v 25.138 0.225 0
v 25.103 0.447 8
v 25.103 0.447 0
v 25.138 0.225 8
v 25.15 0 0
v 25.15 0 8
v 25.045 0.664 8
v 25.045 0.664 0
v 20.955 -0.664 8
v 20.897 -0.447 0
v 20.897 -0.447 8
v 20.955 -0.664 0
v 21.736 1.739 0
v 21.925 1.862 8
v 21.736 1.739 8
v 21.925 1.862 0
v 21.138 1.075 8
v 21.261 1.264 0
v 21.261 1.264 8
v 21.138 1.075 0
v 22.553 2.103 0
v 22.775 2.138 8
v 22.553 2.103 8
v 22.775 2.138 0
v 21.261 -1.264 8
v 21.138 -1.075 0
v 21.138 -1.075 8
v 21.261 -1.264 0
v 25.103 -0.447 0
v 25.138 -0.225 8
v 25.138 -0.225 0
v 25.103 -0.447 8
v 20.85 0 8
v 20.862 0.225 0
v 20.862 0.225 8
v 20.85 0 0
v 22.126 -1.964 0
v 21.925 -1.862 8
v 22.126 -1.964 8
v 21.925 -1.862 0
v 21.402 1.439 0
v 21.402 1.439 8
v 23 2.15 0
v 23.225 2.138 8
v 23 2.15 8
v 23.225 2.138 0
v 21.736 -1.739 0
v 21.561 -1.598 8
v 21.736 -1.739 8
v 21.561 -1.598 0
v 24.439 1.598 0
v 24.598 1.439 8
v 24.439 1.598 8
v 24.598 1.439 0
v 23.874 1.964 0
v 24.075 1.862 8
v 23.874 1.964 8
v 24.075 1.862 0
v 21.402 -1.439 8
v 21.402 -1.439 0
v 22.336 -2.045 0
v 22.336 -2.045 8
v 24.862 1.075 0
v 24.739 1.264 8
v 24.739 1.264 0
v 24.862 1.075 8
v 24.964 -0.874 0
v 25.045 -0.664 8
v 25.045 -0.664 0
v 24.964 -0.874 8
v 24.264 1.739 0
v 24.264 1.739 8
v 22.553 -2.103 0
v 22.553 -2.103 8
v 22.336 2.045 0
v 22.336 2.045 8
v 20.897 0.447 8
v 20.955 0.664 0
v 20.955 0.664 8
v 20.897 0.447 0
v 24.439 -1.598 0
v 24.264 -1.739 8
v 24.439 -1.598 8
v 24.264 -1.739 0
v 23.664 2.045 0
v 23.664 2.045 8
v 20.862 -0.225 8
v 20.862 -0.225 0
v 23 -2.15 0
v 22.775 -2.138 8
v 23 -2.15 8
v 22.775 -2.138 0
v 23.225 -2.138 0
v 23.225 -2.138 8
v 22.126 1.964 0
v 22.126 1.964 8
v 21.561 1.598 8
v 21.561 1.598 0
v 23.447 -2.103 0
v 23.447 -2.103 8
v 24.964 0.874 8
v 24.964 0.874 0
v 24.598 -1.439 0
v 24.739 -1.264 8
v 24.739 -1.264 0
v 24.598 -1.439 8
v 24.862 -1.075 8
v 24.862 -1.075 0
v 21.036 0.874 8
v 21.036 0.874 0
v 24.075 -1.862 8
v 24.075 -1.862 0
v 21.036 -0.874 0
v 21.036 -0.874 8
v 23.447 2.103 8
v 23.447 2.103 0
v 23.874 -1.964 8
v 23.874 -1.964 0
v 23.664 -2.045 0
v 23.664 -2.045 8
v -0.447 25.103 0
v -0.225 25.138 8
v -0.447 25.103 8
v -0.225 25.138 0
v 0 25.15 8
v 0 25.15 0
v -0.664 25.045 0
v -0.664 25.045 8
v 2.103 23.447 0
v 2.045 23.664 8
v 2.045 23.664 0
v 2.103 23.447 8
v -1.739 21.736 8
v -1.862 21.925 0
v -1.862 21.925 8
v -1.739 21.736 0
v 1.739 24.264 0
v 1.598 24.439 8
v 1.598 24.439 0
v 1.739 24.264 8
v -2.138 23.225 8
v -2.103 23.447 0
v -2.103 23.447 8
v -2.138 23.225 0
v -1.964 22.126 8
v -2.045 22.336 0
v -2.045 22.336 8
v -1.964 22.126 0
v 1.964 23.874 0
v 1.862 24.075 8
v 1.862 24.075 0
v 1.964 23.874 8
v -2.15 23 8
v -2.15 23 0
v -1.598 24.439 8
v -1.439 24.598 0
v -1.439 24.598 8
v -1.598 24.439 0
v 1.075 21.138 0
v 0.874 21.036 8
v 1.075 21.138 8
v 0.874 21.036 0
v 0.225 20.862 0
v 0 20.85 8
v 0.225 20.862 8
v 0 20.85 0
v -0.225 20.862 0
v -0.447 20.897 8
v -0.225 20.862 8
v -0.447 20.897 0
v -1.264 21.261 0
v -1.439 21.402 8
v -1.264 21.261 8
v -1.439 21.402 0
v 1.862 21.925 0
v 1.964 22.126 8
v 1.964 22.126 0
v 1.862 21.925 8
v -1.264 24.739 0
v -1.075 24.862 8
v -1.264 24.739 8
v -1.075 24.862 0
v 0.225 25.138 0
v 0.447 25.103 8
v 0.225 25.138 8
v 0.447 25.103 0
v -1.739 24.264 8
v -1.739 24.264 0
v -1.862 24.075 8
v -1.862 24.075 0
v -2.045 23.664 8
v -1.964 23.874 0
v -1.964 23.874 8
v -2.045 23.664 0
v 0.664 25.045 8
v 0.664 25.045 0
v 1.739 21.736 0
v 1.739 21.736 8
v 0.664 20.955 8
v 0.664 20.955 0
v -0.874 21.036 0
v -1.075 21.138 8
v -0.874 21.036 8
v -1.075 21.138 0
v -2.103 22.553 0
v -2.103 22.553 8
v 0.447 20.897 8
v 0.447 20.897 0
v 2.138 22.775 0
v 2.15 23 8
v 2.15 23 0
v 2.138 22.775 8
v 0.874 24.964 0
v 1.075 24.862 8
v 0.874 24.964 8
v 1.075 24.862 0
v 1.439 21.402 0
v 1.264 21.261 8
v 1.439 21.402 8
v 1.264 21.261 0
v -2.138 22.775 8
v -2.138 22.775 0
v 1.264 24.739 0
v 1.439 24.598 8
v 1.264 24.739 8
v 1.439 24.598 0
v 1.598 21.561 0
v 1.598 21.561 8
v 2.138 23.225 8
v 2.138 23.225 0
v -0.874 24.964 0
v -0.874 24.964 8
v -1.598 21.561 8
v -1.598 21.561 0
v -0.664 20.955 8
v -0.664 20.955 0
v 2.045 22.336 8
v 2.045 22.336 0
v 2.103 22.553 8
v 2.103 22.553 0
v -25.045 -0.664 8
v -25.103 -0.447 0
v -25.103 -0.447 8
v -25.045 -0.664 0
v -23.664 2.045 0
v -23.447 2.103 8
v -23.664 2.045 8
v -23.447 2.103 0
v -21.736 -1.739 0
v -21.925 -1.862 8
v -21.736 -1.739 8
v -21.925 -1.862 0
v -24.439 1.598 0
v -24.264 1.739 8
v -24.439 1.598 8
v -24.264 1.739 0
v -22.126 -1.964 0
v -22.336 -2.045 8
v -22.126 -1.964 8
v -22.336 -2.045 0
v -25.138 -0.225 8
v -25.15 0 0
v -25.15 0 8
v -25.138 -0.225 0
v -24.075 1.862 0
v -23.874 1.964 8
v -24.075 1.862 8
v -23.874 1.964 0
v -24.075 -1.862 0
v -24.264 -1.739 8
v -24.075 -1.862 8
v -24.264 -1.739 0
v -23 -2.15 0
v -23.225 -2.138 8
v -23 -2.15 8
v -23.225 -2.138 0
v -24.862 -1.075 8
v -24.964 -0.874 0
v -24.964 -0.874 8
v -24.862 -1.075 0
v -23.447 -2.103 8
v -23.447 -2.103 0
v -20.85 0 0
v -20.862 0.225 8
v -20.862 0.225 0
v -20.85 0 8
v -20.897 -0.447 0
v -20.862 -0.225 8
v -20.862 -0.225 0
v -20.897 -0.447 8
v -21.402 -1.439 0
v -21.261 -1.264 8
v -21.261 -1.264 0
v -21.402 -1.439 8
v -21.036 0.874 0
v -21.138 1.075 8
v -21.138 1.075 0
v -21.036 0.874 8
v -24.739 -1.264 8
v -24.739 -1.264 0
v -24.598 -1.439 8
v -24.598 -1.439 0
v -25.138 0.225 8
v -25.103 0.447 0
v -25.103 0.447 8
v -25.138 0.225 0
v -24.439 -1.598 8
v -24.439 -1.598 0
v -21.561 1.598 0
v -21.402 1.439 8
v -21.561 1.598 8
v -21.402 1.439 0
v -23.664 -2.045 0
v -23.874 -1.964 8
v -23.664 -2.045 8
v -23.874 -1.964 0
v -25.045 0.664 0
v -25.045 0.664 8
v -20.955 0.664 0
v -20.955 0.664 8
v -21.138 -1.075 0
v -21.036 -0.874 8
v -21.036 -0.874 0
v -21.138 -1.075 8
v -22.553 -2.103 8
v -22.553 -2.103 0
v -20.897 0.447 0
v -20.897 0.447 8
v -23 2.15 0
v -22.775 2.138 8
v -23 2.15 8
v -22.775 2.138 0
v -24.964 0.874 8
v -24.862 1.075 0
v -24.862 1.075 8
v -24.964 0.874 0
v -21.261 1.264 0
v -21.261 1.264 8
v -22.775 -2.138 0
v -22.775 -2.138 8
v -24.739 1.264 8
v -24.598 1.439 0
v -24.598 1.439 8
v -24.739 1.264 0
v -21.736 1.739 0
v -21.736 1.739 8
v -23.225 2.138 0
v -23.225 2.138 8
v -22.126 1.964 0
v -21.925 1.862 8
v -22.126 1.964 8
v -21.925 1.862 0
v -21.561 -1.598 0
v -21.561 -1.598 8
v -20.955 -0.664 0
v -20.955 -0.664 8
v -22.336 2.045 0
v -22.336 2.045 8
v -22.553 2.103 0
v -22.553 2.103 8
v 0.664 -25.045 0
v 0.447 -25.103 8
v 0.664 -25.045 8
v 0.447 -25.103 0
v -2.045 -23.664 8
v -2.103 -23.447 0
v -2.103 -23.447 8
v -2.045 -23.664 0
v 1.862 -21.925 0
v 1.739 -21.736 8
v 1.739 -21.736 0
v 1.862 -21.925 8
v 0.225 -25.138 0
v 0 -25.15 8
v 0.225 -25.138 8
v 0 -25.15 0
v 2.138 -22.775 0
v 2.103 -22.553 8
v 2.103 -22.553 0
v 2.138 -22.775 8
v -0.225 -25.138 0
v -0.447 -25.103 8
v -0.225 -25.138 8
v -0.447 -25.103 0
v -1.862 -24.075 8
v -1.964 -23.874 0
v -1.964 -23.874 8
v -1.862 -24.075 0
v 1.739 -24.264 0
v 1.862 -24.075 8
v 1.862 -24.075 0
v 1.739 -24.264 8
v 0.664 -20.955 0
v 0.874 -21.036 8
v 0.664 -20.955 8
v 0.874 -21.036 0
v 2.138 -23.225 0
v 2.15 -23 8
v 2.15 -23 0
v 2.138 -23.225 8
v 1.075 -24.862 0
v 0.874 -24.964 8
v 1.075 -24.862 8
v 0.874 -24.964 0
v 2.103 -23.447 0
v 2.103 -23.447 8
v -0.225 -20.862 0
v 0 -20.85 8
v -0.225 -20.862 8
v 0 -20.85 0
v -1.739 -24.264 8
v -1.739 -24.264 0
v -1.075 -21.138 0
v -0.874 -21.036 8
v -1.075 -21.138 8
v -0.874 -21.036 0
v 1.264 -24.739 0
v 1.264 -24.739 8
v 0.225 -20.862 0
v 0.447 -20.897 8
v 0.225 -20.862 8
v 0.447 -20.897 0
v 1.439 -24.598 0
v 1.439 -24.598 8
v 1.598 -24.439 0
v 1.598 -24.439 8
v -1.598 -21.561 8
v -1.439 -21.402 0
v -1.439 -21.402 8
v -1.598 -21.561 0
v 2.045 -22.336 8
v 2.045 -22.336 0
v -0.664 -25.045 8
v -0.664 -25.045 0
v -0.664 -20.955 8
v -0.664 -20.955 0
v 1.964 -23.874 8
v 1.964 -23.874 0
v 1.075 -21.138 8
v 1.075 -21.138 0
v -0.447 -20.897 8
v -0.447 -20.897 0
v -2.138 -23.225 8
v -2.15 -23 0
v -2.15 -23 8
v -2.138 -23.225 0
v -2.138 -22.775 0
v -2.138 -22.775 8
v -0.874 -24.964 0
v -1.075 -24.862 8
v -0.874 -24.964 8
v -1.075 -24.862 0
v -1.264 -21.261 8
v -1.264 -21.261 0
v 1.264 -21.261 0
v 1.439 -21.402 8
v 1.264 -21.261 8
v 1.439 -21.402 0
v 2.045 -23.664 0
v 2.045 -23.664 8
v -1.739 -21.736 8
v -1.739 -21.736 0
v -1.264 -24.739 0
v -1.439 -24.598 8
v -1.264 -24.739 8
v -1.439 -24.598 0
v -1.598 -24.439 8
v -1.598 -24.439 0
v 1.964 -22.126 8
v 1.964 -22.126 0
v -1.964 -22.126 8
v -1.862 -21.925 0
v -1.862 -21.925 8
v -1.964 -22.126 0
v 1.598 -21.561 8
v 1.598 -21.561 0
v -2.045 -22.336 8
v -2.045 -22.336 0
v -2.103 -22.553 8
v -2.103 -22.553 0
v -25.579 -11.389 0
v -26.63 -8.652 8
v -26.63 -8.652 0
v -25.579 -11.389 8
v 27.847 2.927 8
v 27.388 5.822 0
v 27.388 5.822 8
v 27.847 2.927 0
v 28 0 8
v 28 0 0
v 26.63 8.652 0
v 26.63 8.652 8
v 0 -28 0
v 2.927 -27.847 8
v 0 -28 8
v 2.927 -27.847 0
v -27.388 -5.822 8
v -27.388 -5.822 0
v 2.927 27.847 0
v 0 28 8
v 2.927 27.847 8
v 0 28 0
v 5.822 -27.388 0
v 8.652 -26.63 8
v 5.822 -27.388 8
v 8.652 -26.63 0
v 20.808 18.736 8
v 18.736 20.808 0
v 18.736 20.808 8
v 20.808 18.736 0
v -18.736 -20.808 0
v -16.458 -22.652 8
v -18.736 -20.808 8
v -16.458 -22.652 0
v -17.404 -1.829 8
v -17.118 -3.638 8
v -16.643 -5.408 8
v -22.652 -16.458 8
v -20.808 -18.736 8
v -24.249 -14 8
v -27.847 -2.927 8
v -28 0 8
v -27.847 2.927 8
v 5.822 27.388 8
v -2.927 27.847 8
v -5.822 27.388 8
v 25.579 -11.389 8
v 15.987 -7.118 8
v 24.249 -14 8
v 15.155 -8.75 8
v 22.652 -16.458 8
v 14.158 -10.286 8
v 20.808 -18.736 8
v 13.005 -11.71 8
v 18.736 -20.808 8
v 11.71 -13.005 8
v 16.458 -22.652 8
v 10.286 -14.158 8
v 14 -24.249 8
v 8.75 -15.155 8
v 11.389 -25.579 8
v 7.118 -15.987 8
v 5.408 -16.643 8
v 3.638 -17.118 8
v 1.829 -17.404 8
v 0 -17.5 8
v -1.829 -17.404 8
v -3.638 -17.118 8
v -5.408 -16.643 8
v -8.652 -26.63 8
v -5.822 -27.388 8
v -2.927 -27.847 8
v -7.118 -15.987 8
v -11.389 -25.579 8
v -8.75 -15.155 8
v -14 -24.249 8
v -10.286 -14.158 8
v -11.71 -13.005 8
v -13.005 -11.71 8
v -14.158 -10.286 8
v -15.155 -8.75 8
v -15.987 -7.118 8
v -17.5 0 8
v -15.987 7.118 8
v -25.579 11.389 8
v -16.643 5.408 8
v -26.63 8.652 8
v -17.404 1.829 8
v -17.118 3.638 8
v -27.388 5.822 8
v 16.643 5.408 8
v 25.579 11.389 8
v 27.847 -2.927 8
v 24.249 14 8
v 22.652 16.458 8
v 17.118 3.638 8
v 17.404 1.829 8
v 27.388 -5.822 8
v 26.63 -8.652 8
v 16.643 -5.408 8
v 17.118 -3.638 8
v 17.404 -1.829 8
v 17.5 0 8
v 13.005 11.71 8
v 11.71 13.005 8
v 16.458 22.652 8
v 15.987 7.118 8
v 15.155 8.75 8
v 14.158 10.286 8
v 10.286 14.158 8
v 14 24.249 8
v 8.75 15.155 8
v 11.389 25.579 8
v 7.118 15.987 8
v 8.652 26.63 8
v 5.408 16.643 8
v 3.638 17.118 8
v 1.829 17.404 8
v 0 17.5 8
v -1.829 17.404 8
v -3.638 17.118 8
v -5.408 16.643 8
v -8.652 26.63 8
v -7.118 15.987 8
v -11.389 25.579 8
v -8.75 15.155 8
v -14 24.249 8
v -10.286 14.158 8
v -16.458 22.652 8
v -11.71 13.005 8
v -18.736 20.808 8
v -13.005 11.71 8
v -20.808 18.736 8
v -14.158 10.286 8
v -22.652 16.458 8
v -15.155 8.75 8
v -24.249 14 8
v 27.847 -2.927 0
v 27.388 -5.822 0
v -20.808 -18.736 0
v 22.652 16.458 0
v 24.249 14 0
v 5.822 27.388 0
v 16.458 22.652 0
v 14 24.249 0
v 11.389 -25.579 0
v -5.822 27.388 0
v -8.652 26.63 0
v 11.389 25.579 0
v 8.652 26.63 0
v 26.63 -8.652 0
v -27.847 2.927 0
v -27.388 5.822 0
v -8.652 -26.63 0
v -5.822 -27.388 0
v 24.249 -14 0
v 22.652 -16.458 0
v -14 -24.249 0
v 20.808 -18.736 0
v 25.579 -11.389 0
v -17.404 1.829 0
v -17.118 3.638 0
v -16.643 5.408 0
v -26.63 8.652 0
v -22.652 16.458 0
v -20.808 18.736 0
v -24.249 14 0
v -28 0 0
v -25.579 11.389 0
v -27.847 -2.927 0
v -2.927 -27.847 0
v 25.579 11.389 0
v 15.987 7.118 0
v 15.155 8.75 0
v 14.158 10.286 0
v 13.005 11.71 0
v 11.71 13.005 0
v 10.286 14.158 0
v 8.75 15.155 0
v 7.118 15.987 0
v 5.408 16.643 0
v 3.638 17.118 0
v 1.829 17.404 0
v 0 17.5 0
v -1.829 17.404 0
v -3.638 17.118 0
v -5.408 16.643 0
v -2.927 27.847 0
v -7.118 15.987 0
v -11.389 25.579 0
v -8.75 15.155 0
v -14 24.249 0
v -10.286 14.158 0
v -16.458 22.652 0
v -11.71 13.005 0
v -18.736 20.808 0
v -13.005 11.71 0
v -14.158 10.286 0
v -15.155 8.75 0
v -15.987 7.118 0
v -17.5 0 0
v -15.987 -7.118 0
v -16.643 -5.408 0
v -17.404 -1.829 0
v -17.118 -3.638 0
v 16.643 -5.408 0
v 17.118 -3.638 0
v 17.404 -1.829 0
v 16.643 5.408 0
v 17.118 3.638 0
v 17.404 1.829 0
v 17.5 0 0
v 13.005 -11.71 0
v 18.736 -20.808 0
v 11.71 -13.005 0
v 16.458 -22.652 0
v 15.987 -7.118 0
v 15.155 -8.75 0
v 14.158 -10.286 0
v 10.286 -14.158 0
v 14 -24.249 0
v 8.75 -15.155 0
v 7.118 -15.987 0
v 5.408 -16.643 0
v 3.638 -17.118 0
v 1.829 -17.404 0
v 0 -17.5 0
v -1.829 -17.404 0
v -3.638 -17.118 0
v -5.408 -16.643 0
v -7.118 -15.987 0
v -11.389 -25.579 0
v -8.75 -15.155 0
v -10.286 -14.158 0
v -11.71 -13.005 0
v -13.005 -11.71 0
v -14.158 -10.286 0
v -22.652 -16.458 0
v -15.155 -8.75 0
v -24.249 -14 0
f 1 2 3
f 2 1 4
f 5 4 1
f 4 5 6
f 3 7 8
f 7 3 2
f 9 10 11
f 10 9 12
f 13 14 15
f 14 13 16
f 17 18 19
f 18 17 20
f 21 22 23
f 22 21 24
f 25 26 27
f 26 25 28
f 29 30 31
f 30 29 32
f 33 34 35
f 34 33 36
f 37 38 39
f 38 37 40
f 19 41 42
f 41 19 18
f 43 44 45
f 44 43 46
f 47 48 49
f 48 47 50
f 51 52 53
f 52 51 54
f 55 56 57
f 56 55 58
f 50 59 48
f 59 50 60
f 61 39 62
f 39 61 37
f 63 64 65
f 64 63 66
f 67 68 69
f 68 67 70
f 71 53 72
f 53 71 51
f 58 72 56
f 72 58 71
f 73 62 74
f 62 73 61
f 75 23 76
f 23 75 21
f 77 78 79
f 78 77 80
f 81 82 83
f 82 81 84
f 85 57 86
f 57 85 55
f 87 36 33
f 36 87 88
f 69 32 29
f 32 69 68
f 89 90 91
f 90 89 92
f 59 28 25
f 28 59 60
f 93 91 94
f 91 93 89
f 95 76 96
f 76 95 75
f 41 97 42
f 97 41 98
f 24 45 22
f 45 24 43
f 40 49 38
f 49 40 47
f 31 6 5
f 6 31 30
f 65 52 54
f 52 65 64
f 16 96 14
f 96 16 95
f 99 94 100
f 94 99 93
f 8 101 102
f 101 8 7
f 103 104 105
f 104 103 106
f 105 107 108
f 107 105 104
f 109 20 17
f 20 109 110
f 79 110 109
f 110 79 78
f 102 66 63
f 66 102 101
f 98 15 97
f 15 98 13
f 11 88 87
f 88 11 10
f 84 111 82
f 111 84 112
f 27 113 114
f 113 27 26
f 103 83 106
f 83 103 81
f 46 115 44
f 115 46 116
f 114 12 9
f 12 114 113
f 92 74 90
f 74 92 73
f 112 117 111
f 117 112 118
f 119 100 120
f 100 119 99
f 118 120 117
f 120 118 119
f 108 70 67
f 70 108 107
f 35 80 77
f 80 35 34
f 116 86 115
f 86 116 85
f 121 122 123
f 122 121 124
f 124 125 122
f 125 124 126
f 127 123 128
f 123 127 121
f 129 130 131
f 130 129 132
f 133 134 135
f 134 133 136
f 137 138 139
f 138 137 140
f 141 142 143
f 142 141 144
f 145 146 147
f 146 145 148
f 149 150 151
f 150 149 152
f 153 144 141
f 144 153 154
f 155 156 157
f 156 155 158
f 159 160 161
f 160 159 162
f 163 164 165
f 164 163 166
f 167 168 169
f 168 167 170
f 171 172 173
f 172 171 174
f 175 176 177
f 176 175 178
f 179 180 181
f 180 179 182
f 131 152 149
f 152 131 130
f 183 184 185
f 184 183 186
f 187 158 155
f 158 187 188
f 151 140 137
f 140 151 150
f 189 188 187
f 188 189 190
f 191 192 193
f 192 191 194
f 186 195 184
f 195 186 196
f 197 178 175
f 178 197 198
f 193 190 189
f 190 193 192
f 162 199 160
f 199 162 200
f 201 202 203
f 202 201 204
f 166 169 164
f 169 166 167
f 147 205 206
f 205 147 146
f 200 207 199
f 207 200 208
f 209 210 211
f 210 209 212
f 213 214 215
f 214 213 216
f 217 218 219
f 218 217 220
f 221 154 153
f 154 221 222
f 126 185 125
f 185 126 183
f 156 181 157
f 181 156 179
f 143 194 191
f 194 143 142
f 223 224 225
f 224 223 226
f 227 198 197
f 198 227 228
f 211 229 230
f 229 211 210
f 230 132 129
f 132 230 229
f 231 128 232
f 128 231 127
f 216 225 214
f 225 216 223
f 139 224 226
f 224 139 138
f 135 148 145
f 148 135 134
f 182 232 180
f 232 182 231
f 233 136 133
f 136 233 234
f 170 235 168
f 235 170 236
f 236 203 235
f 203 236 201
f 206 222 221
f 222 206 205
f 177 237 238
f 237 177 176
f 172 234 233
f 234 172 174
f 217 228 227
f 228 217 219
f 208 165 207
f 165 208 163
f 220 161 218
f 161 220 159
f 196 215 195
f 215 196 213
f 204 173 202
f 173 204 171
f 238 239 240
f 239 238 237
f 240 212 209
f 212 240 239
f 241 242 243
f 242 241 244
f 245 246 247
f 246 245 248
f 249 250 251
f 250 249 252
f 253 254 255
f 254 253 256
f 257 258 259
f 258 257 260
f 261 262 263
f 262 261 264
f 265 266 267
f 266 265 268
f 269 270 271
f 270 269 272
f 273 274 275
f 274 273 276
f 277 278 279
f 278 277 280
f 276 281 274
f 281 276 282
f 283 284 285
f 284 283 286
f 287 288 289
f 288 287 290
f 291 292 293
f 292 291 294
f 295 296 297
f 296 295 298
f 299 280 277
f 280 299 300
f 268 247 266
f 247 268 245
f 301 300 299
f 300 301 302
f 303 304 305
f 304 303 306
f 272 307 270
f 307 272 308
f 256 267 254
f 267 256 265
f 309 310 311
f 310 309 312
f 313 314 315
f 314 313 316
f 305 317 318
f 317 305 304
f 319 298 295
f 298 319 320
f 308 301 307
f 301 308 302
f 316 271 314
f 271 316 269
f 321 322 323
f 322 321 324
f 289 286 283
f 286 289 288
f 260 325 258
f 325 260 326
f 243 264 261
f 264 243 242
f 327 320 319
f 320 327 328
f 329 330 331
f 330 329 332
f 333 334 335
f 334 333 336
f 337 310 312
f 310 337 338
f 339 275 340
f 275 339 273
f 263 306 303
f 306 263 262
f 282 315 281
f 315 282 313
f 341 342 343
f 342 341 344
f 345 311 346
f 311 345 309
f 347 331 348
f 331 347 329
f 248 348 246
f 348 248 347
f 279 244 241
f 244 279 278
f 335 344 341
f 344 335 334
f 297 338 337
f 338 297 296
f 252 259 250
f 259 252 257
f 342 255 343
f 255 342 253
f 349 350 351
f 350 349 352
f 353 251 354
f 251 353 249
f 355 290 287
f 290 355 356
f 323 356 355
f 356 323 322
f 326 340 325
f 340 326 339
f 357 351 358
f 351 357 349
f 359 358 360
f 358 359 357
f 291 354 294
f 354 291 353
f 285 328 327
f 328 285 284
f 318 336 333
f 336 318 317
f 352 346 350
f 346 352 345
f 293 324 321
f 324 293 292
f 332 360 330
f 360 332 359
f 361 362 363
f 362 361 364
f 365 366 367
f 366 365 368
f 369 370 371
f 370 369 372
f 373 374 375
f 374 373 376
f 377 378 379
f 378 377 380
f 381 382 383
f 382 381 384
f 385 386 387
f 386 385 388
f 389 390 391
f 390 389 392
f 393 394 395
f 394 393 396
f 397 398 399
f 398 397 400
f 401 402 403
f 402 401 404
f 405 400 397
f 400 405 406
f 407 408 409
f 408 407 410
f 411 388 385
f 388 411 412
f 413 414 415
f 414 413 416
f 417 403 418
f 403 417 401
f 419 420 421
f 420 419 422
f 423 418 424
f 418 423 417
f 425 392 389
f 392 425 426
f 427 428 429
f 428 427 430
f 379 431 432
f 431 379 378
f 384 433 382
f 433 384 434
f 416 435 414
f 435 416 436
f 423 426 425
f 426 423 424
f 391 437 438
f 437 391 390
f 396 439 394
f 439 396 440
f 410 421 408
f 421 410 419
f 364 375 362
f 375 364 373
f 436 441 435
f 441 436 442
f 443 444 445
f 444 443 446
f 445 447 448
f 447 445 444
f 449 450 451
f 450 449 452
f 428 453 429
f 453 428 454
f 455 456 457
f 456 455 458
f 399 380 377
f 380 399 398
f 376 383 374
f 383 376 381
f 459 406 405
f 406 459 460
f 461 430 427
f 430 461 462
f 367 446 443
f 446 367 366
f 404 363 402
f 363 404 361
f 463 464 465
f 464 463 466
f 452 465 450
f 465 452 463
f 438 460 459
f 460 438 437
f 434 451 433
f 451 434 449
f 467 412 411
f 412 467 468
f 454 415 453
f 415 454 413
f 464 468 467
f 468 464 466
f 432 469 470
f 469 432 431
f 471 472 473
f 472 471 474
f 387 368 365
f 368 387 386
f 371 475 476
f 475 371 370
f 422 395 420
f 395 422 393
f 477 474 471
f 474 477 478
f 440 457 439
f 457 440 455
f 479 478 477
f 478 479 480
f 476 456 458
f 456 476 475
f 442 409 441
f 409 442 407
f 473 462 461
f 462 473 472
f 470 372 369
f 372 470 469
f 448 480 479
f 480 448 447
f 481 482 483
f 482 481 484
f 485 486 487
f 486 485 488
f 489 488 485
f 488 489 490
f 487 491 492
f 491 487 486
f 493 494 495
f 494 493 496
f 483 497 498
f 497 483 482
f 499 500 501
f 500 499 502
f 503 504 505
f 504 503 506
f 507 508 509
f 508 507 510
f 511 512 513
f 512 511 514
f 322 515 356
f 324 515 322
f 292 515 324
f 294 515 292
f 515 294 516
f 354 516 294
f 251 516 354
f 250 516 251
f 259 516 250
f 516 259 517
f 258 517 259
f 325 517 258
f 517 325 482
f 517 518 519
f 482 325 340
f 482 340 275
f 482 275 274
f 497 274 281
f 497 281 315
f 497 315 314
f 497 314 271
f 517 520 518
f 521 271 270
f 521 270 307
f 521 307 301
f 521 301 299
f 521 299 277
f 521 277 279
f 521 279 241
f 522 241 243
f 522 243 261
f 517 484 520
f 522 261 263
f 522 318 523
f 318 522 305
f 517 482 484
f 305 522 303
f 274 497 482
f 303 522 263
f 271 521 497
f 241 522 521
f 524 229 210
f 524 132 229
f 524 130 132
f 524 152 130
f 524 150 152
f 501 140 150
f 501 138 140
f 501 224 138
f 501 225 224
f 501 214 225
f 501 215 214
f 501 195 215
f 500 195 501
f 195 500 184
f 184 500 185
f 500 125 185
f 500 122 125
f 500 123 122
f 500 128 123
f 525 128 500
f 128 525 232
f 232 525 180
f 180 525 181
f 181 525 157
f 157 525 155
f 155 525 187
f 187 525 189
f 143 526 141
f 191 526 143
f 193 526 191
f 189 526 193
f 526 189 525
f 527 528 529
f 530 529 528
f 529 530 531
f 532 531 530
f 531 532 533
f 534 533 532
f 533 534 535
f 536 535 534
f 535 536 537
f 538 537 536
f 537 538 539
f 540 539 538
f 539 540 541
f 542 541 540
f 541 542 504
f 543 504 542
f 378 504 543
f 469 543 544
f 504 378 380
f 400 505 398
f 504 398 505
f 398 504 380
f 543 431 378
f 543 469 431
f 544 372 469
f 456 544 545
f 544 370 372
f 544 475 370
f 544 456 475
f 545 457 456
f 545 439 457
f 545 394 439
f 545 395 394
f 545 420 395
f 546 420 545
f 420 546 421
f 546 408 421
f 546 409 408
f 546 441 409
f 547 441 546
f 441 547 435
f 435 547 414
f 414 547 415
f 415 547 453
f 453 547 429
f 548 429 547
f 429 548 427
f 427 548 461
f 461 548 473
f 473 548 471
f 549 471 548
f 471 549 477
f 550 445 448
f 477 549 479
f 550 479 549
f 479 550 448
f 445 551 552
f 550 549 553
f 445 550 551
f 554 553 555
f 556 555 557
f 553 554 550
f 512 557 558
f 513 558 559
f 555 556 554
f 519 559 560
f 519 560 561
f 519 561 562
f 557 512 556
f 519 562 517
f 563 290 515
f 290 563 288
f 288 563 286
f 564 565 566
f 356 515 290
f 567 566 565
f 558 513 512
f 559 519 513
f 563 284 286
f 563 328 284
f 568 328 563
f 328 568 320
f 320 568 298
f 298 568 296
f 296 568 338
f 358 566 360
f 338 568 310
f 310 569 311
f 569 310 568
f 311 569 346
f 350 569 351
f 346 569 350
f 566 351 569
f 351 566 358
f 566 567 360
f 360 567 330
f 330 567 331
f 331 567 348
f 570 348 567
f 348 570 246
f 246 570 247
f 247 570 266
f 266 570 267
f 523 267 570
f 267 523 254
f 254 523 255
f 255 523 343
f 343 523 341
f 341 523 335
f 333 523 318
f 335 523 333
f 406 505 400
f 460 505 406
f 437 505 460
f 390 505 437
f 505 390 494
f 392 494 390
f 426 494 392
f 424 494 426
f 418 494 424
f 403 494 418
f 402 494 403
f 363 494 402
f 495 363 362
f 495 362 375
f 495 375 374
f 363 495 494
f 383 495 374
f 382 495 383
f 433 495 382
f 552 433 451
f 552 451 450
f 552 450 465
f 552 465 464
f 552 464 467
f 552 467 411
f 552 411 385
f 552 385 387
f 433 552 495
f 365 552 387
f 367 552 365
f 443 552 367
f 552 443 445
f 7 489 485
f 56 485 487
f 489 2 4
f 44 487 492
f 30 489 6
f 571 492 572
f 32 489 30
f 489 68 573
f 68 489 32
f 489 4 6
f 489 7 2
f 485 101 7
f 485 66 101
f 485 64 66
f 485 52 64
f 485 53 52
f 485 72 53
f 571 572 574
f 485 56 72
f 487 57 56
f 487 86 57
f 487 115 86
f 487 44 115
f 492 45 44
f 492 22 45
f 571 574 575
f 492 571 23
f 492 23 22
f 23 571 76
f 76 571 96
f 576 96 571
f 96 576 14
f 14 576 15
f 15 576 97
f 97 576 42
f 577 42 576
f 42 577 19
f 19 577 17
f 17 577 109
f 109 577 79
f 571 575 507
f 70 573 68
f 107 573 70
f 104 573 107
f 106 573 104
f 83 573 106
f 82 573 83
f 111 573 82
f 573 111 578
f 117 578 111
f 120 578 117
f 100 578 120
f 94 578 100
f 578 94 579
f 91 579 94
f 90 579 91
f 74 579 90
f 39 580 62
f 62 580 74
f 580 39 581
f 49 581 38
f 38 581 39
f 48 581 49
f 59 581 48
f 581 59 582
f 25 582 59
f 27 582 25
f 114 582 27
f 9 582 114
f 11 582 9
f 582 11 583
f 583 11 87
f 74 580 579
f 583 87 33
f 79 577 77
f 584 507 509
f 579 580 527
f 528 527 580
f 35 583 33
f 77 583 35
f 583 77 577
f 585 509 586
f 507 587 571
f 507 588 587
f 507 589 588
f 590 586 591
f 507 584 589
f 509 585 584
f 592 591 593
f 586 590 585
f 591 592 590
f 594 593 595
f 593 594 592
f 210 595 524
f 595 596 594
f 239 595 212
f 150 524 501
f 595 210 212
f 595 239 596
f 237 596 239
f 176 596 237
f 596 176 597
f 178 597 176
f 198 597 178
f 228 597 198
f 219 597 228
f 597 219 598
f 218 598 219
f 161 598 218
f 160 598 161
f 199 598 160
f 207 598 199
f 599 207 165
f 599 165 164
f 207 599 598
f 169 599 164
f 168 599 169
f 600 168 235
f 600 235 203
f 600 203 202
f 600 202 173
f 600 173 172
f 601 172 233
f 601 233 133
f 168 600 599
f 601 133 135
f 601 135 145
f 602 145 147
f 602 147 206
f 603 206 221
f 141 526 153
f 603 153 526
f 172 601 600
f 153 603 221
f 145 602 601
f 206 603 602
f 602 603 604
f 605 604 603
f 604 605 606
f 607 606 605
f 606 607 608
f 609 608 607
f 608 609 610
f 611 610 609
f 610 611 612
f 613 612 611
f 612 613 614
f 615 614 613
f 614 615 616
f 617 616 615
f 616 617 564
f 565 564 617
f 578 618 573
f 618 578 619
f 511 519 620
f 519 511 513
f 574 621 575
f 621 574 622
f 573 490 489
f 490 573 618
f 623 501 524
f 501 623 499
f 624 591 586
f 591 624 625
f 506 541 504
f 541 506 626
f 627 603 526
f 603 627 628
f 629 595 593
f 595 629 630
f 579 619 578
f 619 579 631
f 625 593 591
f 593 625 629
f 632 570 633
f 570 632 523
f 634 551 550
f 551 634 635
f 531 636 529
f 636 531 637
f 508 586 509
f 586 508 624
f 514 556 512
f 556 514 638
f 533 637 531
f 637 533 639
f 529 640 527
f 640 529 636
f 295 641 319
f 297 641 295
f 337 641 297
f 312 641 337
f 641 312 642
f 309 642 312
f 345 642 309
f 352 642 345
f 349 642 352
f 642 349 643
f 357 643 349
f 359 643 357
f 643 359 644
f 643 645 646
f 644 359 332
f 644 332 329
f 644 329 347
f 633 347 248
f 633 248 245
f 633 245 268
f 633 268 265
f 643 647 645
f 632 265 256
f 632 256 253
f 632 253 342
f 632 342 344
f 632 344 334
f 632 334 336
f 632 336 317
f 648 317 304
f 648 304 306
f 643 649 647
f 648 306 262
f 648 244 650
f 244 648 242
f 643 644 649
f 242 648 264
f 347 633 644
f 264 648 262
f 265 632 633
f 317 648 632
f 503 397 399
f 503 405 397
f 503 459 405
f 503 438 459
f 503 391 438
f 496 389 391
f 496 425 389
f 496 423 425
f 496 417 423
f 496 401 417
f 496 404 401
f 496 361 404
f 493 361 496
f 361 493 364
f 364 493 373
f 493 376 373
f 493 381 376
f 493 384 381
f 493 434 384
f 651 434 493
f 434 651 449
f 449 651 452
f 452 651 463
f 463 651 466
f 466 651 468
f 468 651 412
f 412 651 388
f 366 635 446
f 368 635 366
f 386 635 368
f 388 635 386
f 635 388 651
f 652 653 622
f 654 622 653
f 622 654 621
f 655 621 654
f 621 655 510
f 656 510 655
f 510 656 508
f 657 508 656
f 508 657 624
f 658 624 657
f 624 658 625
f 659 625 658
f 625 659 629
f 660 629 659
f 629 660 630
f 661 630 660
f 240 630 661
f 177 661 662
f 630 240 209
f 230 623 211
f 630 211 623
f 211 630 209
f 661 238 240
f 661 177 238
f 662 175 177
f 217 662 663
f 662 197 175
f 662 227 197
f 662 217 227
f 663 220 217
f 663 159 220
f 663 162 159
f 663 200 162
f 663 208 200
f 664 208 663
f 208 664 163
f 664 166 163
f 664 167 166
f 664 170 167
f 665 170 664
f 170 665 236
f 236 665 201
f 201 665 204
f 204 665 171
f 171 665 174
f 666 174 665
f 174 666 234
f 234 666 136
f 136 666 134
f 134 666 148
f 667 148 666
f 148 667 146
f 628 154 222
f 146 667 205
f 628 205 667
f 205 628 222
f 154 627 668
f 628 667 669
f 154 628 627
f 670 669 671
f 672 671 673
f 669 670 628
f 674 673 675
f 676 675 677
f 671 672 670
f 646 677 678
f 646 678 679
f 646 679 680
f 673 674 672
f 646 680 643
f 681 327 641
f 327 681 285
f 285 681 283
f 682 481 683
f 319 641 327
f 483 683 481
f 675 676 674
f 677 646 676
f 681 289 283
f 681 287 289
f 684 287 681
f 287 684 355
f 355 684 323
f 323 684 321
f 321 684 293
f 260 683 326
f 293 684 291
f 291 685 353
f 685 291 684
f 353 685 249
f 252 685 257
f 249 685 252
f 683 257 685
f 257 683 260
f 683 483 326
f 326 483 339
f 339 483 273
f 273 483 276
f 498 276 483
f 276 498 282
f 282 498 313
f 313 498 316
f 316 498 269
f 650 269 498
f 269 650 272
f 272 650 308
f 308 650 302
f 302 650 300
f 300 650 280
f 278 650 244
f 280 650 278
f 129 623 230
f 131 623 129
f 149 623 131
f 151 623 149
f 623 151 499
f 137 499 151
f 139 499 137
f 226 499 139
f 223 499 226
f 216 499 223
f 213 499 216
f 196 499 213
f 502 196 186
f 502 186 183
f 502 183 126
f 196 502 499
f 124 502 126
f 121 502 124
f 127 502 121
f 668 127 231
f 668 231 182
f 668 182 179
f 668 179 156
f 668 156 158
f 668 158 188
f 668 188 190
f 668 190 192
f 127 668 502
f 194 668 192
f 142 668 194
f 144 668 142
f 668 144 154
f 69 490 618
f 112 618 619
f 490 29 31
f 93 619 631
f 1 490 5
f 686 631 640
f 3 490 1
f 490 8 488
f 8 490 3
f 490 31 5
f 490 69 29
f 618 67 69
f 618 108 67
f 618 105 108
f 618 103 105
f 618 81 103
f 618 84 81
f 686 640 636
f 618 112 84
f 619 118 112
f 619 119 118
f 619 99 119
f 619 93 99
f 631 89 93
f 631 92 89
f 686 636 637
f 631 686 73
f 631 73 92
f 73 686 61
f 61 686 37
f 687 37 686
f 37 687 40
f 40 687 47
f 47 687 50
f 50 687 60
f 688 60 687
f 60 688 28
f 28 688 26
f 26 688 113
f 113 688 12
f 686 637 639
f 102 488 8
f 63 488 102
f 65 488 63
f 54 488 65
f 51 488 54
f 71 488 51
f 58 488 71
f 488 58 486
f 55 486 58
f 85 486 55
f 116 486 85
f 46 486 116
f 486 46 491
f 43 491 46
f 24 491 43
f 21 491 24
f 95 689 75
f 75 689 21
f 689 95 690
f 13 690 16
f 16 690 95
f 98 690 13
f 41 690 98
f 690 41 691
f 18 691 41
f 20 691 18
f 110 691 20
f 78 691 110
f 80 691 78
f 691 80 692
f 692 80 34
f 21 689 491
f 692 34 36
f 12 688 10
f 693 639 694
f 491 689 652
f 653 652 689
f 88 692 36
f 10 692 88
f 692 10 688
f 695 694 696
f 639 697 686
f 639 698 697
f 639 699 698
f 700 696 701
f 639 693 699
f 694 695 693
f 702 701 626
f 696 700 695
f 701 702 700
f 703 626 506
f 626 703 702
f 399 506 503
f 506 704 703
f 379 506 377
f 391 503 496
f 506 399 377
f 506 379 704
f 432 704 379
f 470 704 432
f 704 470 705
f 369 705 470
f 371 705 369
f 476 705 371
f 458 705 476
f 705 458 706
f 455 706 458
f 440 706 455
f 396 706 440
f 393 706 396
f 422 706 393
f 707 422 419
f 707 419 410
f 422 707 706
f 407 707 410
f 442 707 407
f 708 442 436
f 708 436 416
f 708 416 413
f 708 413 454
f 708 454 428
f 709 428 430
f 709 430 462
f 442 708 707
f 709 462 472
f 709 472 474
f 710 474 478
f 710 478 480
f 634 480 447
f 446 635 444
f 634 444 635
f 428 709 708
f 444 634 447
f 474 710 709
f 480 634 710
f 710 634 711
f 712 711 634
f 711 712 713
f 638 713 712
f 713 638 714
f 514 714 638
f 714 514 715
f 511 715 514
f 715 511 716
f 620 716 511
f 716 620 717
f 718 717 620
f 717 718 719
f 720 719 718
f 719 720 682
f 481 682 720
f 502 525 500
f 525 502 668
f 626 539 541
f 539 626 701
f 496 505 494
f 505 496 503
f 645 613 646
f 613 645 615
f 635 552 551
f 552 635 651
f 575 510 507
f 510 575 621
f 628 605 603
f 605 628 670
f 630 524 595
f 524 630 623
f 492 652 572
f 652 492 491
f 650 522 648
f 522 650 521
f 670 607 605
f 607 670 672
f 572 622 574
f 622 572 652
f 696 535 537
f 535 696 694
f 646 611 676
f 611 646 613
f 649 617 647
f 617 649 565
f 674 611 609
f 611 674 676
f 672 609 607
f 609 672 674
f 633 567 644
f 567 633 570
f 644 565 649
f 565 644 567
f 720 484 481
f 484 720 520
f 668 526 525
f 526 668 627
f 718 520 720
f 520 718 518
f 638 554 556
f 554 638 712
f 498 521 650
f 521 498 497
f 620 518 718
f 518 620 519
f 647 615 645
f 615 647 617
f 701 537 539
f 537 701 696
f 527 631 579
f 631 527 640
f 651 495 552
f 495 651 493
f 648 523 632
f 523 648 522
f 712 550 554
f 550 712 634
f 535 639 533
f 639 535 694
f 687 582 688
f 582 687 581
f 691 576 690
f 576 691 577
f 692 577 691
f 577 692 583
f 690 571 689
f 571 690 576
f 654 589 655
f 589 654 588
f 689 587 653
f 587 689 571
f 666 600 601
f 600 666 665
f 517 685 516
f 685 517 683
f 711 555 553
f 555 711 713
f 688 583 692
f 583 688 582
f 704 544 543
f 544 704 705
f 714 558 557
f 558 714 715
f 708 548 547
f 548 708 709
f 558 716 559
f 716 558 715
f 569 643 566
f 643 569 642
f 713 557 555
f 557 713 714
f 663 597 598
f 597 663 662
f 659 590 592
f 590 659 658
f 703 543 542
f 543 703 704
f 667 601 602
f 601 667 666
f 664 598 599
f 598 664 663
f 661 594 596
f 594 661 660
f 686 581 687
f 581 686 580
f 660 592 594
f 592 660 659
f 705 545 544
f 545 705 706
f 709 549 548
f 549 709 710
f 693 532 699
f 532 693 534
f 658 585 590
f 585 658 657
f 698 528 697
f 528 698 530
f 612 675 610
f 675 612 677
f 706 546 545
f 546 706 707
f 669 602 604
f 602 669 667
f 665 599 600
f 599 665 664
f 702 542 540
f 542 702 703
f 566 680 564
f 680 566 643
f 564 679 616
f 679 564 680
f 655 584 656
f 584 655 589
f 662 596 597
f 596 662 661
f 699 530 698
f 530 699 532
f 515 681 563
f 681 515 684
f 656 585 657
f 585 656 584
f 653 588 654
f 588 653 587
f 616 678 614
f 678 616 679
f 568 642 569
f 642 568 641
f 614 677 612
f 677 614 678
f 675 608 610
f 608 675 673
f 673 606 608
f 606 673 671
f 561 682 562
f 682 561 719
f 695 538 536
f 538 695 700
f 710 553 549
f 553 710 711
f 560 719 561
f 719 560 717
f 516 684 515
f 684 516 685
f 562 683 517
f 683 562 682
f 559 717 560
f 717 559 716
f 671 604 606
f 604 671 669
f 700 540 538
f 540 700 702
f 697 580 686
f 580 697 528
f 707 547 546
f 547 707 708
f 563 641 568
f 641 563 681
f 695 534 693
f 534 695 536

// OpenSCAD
// Shaft-seal holder plate.
$fn = 60;
eps = 0.02;
seal_d = 35;
outer_d = 56;
plate_t = 8;
difference() { cylinder(d=outer_d,h=plate_t); translate([0,0,-eps]) cylinder(d=seal_d,h=plate_t+2*eps); for(i=[0:3]) rotate([0,0,i*90]) translate([outer_d/2-5,0,-eps]) cylinder(d=4.3,h=plate_t+2*eps); }
